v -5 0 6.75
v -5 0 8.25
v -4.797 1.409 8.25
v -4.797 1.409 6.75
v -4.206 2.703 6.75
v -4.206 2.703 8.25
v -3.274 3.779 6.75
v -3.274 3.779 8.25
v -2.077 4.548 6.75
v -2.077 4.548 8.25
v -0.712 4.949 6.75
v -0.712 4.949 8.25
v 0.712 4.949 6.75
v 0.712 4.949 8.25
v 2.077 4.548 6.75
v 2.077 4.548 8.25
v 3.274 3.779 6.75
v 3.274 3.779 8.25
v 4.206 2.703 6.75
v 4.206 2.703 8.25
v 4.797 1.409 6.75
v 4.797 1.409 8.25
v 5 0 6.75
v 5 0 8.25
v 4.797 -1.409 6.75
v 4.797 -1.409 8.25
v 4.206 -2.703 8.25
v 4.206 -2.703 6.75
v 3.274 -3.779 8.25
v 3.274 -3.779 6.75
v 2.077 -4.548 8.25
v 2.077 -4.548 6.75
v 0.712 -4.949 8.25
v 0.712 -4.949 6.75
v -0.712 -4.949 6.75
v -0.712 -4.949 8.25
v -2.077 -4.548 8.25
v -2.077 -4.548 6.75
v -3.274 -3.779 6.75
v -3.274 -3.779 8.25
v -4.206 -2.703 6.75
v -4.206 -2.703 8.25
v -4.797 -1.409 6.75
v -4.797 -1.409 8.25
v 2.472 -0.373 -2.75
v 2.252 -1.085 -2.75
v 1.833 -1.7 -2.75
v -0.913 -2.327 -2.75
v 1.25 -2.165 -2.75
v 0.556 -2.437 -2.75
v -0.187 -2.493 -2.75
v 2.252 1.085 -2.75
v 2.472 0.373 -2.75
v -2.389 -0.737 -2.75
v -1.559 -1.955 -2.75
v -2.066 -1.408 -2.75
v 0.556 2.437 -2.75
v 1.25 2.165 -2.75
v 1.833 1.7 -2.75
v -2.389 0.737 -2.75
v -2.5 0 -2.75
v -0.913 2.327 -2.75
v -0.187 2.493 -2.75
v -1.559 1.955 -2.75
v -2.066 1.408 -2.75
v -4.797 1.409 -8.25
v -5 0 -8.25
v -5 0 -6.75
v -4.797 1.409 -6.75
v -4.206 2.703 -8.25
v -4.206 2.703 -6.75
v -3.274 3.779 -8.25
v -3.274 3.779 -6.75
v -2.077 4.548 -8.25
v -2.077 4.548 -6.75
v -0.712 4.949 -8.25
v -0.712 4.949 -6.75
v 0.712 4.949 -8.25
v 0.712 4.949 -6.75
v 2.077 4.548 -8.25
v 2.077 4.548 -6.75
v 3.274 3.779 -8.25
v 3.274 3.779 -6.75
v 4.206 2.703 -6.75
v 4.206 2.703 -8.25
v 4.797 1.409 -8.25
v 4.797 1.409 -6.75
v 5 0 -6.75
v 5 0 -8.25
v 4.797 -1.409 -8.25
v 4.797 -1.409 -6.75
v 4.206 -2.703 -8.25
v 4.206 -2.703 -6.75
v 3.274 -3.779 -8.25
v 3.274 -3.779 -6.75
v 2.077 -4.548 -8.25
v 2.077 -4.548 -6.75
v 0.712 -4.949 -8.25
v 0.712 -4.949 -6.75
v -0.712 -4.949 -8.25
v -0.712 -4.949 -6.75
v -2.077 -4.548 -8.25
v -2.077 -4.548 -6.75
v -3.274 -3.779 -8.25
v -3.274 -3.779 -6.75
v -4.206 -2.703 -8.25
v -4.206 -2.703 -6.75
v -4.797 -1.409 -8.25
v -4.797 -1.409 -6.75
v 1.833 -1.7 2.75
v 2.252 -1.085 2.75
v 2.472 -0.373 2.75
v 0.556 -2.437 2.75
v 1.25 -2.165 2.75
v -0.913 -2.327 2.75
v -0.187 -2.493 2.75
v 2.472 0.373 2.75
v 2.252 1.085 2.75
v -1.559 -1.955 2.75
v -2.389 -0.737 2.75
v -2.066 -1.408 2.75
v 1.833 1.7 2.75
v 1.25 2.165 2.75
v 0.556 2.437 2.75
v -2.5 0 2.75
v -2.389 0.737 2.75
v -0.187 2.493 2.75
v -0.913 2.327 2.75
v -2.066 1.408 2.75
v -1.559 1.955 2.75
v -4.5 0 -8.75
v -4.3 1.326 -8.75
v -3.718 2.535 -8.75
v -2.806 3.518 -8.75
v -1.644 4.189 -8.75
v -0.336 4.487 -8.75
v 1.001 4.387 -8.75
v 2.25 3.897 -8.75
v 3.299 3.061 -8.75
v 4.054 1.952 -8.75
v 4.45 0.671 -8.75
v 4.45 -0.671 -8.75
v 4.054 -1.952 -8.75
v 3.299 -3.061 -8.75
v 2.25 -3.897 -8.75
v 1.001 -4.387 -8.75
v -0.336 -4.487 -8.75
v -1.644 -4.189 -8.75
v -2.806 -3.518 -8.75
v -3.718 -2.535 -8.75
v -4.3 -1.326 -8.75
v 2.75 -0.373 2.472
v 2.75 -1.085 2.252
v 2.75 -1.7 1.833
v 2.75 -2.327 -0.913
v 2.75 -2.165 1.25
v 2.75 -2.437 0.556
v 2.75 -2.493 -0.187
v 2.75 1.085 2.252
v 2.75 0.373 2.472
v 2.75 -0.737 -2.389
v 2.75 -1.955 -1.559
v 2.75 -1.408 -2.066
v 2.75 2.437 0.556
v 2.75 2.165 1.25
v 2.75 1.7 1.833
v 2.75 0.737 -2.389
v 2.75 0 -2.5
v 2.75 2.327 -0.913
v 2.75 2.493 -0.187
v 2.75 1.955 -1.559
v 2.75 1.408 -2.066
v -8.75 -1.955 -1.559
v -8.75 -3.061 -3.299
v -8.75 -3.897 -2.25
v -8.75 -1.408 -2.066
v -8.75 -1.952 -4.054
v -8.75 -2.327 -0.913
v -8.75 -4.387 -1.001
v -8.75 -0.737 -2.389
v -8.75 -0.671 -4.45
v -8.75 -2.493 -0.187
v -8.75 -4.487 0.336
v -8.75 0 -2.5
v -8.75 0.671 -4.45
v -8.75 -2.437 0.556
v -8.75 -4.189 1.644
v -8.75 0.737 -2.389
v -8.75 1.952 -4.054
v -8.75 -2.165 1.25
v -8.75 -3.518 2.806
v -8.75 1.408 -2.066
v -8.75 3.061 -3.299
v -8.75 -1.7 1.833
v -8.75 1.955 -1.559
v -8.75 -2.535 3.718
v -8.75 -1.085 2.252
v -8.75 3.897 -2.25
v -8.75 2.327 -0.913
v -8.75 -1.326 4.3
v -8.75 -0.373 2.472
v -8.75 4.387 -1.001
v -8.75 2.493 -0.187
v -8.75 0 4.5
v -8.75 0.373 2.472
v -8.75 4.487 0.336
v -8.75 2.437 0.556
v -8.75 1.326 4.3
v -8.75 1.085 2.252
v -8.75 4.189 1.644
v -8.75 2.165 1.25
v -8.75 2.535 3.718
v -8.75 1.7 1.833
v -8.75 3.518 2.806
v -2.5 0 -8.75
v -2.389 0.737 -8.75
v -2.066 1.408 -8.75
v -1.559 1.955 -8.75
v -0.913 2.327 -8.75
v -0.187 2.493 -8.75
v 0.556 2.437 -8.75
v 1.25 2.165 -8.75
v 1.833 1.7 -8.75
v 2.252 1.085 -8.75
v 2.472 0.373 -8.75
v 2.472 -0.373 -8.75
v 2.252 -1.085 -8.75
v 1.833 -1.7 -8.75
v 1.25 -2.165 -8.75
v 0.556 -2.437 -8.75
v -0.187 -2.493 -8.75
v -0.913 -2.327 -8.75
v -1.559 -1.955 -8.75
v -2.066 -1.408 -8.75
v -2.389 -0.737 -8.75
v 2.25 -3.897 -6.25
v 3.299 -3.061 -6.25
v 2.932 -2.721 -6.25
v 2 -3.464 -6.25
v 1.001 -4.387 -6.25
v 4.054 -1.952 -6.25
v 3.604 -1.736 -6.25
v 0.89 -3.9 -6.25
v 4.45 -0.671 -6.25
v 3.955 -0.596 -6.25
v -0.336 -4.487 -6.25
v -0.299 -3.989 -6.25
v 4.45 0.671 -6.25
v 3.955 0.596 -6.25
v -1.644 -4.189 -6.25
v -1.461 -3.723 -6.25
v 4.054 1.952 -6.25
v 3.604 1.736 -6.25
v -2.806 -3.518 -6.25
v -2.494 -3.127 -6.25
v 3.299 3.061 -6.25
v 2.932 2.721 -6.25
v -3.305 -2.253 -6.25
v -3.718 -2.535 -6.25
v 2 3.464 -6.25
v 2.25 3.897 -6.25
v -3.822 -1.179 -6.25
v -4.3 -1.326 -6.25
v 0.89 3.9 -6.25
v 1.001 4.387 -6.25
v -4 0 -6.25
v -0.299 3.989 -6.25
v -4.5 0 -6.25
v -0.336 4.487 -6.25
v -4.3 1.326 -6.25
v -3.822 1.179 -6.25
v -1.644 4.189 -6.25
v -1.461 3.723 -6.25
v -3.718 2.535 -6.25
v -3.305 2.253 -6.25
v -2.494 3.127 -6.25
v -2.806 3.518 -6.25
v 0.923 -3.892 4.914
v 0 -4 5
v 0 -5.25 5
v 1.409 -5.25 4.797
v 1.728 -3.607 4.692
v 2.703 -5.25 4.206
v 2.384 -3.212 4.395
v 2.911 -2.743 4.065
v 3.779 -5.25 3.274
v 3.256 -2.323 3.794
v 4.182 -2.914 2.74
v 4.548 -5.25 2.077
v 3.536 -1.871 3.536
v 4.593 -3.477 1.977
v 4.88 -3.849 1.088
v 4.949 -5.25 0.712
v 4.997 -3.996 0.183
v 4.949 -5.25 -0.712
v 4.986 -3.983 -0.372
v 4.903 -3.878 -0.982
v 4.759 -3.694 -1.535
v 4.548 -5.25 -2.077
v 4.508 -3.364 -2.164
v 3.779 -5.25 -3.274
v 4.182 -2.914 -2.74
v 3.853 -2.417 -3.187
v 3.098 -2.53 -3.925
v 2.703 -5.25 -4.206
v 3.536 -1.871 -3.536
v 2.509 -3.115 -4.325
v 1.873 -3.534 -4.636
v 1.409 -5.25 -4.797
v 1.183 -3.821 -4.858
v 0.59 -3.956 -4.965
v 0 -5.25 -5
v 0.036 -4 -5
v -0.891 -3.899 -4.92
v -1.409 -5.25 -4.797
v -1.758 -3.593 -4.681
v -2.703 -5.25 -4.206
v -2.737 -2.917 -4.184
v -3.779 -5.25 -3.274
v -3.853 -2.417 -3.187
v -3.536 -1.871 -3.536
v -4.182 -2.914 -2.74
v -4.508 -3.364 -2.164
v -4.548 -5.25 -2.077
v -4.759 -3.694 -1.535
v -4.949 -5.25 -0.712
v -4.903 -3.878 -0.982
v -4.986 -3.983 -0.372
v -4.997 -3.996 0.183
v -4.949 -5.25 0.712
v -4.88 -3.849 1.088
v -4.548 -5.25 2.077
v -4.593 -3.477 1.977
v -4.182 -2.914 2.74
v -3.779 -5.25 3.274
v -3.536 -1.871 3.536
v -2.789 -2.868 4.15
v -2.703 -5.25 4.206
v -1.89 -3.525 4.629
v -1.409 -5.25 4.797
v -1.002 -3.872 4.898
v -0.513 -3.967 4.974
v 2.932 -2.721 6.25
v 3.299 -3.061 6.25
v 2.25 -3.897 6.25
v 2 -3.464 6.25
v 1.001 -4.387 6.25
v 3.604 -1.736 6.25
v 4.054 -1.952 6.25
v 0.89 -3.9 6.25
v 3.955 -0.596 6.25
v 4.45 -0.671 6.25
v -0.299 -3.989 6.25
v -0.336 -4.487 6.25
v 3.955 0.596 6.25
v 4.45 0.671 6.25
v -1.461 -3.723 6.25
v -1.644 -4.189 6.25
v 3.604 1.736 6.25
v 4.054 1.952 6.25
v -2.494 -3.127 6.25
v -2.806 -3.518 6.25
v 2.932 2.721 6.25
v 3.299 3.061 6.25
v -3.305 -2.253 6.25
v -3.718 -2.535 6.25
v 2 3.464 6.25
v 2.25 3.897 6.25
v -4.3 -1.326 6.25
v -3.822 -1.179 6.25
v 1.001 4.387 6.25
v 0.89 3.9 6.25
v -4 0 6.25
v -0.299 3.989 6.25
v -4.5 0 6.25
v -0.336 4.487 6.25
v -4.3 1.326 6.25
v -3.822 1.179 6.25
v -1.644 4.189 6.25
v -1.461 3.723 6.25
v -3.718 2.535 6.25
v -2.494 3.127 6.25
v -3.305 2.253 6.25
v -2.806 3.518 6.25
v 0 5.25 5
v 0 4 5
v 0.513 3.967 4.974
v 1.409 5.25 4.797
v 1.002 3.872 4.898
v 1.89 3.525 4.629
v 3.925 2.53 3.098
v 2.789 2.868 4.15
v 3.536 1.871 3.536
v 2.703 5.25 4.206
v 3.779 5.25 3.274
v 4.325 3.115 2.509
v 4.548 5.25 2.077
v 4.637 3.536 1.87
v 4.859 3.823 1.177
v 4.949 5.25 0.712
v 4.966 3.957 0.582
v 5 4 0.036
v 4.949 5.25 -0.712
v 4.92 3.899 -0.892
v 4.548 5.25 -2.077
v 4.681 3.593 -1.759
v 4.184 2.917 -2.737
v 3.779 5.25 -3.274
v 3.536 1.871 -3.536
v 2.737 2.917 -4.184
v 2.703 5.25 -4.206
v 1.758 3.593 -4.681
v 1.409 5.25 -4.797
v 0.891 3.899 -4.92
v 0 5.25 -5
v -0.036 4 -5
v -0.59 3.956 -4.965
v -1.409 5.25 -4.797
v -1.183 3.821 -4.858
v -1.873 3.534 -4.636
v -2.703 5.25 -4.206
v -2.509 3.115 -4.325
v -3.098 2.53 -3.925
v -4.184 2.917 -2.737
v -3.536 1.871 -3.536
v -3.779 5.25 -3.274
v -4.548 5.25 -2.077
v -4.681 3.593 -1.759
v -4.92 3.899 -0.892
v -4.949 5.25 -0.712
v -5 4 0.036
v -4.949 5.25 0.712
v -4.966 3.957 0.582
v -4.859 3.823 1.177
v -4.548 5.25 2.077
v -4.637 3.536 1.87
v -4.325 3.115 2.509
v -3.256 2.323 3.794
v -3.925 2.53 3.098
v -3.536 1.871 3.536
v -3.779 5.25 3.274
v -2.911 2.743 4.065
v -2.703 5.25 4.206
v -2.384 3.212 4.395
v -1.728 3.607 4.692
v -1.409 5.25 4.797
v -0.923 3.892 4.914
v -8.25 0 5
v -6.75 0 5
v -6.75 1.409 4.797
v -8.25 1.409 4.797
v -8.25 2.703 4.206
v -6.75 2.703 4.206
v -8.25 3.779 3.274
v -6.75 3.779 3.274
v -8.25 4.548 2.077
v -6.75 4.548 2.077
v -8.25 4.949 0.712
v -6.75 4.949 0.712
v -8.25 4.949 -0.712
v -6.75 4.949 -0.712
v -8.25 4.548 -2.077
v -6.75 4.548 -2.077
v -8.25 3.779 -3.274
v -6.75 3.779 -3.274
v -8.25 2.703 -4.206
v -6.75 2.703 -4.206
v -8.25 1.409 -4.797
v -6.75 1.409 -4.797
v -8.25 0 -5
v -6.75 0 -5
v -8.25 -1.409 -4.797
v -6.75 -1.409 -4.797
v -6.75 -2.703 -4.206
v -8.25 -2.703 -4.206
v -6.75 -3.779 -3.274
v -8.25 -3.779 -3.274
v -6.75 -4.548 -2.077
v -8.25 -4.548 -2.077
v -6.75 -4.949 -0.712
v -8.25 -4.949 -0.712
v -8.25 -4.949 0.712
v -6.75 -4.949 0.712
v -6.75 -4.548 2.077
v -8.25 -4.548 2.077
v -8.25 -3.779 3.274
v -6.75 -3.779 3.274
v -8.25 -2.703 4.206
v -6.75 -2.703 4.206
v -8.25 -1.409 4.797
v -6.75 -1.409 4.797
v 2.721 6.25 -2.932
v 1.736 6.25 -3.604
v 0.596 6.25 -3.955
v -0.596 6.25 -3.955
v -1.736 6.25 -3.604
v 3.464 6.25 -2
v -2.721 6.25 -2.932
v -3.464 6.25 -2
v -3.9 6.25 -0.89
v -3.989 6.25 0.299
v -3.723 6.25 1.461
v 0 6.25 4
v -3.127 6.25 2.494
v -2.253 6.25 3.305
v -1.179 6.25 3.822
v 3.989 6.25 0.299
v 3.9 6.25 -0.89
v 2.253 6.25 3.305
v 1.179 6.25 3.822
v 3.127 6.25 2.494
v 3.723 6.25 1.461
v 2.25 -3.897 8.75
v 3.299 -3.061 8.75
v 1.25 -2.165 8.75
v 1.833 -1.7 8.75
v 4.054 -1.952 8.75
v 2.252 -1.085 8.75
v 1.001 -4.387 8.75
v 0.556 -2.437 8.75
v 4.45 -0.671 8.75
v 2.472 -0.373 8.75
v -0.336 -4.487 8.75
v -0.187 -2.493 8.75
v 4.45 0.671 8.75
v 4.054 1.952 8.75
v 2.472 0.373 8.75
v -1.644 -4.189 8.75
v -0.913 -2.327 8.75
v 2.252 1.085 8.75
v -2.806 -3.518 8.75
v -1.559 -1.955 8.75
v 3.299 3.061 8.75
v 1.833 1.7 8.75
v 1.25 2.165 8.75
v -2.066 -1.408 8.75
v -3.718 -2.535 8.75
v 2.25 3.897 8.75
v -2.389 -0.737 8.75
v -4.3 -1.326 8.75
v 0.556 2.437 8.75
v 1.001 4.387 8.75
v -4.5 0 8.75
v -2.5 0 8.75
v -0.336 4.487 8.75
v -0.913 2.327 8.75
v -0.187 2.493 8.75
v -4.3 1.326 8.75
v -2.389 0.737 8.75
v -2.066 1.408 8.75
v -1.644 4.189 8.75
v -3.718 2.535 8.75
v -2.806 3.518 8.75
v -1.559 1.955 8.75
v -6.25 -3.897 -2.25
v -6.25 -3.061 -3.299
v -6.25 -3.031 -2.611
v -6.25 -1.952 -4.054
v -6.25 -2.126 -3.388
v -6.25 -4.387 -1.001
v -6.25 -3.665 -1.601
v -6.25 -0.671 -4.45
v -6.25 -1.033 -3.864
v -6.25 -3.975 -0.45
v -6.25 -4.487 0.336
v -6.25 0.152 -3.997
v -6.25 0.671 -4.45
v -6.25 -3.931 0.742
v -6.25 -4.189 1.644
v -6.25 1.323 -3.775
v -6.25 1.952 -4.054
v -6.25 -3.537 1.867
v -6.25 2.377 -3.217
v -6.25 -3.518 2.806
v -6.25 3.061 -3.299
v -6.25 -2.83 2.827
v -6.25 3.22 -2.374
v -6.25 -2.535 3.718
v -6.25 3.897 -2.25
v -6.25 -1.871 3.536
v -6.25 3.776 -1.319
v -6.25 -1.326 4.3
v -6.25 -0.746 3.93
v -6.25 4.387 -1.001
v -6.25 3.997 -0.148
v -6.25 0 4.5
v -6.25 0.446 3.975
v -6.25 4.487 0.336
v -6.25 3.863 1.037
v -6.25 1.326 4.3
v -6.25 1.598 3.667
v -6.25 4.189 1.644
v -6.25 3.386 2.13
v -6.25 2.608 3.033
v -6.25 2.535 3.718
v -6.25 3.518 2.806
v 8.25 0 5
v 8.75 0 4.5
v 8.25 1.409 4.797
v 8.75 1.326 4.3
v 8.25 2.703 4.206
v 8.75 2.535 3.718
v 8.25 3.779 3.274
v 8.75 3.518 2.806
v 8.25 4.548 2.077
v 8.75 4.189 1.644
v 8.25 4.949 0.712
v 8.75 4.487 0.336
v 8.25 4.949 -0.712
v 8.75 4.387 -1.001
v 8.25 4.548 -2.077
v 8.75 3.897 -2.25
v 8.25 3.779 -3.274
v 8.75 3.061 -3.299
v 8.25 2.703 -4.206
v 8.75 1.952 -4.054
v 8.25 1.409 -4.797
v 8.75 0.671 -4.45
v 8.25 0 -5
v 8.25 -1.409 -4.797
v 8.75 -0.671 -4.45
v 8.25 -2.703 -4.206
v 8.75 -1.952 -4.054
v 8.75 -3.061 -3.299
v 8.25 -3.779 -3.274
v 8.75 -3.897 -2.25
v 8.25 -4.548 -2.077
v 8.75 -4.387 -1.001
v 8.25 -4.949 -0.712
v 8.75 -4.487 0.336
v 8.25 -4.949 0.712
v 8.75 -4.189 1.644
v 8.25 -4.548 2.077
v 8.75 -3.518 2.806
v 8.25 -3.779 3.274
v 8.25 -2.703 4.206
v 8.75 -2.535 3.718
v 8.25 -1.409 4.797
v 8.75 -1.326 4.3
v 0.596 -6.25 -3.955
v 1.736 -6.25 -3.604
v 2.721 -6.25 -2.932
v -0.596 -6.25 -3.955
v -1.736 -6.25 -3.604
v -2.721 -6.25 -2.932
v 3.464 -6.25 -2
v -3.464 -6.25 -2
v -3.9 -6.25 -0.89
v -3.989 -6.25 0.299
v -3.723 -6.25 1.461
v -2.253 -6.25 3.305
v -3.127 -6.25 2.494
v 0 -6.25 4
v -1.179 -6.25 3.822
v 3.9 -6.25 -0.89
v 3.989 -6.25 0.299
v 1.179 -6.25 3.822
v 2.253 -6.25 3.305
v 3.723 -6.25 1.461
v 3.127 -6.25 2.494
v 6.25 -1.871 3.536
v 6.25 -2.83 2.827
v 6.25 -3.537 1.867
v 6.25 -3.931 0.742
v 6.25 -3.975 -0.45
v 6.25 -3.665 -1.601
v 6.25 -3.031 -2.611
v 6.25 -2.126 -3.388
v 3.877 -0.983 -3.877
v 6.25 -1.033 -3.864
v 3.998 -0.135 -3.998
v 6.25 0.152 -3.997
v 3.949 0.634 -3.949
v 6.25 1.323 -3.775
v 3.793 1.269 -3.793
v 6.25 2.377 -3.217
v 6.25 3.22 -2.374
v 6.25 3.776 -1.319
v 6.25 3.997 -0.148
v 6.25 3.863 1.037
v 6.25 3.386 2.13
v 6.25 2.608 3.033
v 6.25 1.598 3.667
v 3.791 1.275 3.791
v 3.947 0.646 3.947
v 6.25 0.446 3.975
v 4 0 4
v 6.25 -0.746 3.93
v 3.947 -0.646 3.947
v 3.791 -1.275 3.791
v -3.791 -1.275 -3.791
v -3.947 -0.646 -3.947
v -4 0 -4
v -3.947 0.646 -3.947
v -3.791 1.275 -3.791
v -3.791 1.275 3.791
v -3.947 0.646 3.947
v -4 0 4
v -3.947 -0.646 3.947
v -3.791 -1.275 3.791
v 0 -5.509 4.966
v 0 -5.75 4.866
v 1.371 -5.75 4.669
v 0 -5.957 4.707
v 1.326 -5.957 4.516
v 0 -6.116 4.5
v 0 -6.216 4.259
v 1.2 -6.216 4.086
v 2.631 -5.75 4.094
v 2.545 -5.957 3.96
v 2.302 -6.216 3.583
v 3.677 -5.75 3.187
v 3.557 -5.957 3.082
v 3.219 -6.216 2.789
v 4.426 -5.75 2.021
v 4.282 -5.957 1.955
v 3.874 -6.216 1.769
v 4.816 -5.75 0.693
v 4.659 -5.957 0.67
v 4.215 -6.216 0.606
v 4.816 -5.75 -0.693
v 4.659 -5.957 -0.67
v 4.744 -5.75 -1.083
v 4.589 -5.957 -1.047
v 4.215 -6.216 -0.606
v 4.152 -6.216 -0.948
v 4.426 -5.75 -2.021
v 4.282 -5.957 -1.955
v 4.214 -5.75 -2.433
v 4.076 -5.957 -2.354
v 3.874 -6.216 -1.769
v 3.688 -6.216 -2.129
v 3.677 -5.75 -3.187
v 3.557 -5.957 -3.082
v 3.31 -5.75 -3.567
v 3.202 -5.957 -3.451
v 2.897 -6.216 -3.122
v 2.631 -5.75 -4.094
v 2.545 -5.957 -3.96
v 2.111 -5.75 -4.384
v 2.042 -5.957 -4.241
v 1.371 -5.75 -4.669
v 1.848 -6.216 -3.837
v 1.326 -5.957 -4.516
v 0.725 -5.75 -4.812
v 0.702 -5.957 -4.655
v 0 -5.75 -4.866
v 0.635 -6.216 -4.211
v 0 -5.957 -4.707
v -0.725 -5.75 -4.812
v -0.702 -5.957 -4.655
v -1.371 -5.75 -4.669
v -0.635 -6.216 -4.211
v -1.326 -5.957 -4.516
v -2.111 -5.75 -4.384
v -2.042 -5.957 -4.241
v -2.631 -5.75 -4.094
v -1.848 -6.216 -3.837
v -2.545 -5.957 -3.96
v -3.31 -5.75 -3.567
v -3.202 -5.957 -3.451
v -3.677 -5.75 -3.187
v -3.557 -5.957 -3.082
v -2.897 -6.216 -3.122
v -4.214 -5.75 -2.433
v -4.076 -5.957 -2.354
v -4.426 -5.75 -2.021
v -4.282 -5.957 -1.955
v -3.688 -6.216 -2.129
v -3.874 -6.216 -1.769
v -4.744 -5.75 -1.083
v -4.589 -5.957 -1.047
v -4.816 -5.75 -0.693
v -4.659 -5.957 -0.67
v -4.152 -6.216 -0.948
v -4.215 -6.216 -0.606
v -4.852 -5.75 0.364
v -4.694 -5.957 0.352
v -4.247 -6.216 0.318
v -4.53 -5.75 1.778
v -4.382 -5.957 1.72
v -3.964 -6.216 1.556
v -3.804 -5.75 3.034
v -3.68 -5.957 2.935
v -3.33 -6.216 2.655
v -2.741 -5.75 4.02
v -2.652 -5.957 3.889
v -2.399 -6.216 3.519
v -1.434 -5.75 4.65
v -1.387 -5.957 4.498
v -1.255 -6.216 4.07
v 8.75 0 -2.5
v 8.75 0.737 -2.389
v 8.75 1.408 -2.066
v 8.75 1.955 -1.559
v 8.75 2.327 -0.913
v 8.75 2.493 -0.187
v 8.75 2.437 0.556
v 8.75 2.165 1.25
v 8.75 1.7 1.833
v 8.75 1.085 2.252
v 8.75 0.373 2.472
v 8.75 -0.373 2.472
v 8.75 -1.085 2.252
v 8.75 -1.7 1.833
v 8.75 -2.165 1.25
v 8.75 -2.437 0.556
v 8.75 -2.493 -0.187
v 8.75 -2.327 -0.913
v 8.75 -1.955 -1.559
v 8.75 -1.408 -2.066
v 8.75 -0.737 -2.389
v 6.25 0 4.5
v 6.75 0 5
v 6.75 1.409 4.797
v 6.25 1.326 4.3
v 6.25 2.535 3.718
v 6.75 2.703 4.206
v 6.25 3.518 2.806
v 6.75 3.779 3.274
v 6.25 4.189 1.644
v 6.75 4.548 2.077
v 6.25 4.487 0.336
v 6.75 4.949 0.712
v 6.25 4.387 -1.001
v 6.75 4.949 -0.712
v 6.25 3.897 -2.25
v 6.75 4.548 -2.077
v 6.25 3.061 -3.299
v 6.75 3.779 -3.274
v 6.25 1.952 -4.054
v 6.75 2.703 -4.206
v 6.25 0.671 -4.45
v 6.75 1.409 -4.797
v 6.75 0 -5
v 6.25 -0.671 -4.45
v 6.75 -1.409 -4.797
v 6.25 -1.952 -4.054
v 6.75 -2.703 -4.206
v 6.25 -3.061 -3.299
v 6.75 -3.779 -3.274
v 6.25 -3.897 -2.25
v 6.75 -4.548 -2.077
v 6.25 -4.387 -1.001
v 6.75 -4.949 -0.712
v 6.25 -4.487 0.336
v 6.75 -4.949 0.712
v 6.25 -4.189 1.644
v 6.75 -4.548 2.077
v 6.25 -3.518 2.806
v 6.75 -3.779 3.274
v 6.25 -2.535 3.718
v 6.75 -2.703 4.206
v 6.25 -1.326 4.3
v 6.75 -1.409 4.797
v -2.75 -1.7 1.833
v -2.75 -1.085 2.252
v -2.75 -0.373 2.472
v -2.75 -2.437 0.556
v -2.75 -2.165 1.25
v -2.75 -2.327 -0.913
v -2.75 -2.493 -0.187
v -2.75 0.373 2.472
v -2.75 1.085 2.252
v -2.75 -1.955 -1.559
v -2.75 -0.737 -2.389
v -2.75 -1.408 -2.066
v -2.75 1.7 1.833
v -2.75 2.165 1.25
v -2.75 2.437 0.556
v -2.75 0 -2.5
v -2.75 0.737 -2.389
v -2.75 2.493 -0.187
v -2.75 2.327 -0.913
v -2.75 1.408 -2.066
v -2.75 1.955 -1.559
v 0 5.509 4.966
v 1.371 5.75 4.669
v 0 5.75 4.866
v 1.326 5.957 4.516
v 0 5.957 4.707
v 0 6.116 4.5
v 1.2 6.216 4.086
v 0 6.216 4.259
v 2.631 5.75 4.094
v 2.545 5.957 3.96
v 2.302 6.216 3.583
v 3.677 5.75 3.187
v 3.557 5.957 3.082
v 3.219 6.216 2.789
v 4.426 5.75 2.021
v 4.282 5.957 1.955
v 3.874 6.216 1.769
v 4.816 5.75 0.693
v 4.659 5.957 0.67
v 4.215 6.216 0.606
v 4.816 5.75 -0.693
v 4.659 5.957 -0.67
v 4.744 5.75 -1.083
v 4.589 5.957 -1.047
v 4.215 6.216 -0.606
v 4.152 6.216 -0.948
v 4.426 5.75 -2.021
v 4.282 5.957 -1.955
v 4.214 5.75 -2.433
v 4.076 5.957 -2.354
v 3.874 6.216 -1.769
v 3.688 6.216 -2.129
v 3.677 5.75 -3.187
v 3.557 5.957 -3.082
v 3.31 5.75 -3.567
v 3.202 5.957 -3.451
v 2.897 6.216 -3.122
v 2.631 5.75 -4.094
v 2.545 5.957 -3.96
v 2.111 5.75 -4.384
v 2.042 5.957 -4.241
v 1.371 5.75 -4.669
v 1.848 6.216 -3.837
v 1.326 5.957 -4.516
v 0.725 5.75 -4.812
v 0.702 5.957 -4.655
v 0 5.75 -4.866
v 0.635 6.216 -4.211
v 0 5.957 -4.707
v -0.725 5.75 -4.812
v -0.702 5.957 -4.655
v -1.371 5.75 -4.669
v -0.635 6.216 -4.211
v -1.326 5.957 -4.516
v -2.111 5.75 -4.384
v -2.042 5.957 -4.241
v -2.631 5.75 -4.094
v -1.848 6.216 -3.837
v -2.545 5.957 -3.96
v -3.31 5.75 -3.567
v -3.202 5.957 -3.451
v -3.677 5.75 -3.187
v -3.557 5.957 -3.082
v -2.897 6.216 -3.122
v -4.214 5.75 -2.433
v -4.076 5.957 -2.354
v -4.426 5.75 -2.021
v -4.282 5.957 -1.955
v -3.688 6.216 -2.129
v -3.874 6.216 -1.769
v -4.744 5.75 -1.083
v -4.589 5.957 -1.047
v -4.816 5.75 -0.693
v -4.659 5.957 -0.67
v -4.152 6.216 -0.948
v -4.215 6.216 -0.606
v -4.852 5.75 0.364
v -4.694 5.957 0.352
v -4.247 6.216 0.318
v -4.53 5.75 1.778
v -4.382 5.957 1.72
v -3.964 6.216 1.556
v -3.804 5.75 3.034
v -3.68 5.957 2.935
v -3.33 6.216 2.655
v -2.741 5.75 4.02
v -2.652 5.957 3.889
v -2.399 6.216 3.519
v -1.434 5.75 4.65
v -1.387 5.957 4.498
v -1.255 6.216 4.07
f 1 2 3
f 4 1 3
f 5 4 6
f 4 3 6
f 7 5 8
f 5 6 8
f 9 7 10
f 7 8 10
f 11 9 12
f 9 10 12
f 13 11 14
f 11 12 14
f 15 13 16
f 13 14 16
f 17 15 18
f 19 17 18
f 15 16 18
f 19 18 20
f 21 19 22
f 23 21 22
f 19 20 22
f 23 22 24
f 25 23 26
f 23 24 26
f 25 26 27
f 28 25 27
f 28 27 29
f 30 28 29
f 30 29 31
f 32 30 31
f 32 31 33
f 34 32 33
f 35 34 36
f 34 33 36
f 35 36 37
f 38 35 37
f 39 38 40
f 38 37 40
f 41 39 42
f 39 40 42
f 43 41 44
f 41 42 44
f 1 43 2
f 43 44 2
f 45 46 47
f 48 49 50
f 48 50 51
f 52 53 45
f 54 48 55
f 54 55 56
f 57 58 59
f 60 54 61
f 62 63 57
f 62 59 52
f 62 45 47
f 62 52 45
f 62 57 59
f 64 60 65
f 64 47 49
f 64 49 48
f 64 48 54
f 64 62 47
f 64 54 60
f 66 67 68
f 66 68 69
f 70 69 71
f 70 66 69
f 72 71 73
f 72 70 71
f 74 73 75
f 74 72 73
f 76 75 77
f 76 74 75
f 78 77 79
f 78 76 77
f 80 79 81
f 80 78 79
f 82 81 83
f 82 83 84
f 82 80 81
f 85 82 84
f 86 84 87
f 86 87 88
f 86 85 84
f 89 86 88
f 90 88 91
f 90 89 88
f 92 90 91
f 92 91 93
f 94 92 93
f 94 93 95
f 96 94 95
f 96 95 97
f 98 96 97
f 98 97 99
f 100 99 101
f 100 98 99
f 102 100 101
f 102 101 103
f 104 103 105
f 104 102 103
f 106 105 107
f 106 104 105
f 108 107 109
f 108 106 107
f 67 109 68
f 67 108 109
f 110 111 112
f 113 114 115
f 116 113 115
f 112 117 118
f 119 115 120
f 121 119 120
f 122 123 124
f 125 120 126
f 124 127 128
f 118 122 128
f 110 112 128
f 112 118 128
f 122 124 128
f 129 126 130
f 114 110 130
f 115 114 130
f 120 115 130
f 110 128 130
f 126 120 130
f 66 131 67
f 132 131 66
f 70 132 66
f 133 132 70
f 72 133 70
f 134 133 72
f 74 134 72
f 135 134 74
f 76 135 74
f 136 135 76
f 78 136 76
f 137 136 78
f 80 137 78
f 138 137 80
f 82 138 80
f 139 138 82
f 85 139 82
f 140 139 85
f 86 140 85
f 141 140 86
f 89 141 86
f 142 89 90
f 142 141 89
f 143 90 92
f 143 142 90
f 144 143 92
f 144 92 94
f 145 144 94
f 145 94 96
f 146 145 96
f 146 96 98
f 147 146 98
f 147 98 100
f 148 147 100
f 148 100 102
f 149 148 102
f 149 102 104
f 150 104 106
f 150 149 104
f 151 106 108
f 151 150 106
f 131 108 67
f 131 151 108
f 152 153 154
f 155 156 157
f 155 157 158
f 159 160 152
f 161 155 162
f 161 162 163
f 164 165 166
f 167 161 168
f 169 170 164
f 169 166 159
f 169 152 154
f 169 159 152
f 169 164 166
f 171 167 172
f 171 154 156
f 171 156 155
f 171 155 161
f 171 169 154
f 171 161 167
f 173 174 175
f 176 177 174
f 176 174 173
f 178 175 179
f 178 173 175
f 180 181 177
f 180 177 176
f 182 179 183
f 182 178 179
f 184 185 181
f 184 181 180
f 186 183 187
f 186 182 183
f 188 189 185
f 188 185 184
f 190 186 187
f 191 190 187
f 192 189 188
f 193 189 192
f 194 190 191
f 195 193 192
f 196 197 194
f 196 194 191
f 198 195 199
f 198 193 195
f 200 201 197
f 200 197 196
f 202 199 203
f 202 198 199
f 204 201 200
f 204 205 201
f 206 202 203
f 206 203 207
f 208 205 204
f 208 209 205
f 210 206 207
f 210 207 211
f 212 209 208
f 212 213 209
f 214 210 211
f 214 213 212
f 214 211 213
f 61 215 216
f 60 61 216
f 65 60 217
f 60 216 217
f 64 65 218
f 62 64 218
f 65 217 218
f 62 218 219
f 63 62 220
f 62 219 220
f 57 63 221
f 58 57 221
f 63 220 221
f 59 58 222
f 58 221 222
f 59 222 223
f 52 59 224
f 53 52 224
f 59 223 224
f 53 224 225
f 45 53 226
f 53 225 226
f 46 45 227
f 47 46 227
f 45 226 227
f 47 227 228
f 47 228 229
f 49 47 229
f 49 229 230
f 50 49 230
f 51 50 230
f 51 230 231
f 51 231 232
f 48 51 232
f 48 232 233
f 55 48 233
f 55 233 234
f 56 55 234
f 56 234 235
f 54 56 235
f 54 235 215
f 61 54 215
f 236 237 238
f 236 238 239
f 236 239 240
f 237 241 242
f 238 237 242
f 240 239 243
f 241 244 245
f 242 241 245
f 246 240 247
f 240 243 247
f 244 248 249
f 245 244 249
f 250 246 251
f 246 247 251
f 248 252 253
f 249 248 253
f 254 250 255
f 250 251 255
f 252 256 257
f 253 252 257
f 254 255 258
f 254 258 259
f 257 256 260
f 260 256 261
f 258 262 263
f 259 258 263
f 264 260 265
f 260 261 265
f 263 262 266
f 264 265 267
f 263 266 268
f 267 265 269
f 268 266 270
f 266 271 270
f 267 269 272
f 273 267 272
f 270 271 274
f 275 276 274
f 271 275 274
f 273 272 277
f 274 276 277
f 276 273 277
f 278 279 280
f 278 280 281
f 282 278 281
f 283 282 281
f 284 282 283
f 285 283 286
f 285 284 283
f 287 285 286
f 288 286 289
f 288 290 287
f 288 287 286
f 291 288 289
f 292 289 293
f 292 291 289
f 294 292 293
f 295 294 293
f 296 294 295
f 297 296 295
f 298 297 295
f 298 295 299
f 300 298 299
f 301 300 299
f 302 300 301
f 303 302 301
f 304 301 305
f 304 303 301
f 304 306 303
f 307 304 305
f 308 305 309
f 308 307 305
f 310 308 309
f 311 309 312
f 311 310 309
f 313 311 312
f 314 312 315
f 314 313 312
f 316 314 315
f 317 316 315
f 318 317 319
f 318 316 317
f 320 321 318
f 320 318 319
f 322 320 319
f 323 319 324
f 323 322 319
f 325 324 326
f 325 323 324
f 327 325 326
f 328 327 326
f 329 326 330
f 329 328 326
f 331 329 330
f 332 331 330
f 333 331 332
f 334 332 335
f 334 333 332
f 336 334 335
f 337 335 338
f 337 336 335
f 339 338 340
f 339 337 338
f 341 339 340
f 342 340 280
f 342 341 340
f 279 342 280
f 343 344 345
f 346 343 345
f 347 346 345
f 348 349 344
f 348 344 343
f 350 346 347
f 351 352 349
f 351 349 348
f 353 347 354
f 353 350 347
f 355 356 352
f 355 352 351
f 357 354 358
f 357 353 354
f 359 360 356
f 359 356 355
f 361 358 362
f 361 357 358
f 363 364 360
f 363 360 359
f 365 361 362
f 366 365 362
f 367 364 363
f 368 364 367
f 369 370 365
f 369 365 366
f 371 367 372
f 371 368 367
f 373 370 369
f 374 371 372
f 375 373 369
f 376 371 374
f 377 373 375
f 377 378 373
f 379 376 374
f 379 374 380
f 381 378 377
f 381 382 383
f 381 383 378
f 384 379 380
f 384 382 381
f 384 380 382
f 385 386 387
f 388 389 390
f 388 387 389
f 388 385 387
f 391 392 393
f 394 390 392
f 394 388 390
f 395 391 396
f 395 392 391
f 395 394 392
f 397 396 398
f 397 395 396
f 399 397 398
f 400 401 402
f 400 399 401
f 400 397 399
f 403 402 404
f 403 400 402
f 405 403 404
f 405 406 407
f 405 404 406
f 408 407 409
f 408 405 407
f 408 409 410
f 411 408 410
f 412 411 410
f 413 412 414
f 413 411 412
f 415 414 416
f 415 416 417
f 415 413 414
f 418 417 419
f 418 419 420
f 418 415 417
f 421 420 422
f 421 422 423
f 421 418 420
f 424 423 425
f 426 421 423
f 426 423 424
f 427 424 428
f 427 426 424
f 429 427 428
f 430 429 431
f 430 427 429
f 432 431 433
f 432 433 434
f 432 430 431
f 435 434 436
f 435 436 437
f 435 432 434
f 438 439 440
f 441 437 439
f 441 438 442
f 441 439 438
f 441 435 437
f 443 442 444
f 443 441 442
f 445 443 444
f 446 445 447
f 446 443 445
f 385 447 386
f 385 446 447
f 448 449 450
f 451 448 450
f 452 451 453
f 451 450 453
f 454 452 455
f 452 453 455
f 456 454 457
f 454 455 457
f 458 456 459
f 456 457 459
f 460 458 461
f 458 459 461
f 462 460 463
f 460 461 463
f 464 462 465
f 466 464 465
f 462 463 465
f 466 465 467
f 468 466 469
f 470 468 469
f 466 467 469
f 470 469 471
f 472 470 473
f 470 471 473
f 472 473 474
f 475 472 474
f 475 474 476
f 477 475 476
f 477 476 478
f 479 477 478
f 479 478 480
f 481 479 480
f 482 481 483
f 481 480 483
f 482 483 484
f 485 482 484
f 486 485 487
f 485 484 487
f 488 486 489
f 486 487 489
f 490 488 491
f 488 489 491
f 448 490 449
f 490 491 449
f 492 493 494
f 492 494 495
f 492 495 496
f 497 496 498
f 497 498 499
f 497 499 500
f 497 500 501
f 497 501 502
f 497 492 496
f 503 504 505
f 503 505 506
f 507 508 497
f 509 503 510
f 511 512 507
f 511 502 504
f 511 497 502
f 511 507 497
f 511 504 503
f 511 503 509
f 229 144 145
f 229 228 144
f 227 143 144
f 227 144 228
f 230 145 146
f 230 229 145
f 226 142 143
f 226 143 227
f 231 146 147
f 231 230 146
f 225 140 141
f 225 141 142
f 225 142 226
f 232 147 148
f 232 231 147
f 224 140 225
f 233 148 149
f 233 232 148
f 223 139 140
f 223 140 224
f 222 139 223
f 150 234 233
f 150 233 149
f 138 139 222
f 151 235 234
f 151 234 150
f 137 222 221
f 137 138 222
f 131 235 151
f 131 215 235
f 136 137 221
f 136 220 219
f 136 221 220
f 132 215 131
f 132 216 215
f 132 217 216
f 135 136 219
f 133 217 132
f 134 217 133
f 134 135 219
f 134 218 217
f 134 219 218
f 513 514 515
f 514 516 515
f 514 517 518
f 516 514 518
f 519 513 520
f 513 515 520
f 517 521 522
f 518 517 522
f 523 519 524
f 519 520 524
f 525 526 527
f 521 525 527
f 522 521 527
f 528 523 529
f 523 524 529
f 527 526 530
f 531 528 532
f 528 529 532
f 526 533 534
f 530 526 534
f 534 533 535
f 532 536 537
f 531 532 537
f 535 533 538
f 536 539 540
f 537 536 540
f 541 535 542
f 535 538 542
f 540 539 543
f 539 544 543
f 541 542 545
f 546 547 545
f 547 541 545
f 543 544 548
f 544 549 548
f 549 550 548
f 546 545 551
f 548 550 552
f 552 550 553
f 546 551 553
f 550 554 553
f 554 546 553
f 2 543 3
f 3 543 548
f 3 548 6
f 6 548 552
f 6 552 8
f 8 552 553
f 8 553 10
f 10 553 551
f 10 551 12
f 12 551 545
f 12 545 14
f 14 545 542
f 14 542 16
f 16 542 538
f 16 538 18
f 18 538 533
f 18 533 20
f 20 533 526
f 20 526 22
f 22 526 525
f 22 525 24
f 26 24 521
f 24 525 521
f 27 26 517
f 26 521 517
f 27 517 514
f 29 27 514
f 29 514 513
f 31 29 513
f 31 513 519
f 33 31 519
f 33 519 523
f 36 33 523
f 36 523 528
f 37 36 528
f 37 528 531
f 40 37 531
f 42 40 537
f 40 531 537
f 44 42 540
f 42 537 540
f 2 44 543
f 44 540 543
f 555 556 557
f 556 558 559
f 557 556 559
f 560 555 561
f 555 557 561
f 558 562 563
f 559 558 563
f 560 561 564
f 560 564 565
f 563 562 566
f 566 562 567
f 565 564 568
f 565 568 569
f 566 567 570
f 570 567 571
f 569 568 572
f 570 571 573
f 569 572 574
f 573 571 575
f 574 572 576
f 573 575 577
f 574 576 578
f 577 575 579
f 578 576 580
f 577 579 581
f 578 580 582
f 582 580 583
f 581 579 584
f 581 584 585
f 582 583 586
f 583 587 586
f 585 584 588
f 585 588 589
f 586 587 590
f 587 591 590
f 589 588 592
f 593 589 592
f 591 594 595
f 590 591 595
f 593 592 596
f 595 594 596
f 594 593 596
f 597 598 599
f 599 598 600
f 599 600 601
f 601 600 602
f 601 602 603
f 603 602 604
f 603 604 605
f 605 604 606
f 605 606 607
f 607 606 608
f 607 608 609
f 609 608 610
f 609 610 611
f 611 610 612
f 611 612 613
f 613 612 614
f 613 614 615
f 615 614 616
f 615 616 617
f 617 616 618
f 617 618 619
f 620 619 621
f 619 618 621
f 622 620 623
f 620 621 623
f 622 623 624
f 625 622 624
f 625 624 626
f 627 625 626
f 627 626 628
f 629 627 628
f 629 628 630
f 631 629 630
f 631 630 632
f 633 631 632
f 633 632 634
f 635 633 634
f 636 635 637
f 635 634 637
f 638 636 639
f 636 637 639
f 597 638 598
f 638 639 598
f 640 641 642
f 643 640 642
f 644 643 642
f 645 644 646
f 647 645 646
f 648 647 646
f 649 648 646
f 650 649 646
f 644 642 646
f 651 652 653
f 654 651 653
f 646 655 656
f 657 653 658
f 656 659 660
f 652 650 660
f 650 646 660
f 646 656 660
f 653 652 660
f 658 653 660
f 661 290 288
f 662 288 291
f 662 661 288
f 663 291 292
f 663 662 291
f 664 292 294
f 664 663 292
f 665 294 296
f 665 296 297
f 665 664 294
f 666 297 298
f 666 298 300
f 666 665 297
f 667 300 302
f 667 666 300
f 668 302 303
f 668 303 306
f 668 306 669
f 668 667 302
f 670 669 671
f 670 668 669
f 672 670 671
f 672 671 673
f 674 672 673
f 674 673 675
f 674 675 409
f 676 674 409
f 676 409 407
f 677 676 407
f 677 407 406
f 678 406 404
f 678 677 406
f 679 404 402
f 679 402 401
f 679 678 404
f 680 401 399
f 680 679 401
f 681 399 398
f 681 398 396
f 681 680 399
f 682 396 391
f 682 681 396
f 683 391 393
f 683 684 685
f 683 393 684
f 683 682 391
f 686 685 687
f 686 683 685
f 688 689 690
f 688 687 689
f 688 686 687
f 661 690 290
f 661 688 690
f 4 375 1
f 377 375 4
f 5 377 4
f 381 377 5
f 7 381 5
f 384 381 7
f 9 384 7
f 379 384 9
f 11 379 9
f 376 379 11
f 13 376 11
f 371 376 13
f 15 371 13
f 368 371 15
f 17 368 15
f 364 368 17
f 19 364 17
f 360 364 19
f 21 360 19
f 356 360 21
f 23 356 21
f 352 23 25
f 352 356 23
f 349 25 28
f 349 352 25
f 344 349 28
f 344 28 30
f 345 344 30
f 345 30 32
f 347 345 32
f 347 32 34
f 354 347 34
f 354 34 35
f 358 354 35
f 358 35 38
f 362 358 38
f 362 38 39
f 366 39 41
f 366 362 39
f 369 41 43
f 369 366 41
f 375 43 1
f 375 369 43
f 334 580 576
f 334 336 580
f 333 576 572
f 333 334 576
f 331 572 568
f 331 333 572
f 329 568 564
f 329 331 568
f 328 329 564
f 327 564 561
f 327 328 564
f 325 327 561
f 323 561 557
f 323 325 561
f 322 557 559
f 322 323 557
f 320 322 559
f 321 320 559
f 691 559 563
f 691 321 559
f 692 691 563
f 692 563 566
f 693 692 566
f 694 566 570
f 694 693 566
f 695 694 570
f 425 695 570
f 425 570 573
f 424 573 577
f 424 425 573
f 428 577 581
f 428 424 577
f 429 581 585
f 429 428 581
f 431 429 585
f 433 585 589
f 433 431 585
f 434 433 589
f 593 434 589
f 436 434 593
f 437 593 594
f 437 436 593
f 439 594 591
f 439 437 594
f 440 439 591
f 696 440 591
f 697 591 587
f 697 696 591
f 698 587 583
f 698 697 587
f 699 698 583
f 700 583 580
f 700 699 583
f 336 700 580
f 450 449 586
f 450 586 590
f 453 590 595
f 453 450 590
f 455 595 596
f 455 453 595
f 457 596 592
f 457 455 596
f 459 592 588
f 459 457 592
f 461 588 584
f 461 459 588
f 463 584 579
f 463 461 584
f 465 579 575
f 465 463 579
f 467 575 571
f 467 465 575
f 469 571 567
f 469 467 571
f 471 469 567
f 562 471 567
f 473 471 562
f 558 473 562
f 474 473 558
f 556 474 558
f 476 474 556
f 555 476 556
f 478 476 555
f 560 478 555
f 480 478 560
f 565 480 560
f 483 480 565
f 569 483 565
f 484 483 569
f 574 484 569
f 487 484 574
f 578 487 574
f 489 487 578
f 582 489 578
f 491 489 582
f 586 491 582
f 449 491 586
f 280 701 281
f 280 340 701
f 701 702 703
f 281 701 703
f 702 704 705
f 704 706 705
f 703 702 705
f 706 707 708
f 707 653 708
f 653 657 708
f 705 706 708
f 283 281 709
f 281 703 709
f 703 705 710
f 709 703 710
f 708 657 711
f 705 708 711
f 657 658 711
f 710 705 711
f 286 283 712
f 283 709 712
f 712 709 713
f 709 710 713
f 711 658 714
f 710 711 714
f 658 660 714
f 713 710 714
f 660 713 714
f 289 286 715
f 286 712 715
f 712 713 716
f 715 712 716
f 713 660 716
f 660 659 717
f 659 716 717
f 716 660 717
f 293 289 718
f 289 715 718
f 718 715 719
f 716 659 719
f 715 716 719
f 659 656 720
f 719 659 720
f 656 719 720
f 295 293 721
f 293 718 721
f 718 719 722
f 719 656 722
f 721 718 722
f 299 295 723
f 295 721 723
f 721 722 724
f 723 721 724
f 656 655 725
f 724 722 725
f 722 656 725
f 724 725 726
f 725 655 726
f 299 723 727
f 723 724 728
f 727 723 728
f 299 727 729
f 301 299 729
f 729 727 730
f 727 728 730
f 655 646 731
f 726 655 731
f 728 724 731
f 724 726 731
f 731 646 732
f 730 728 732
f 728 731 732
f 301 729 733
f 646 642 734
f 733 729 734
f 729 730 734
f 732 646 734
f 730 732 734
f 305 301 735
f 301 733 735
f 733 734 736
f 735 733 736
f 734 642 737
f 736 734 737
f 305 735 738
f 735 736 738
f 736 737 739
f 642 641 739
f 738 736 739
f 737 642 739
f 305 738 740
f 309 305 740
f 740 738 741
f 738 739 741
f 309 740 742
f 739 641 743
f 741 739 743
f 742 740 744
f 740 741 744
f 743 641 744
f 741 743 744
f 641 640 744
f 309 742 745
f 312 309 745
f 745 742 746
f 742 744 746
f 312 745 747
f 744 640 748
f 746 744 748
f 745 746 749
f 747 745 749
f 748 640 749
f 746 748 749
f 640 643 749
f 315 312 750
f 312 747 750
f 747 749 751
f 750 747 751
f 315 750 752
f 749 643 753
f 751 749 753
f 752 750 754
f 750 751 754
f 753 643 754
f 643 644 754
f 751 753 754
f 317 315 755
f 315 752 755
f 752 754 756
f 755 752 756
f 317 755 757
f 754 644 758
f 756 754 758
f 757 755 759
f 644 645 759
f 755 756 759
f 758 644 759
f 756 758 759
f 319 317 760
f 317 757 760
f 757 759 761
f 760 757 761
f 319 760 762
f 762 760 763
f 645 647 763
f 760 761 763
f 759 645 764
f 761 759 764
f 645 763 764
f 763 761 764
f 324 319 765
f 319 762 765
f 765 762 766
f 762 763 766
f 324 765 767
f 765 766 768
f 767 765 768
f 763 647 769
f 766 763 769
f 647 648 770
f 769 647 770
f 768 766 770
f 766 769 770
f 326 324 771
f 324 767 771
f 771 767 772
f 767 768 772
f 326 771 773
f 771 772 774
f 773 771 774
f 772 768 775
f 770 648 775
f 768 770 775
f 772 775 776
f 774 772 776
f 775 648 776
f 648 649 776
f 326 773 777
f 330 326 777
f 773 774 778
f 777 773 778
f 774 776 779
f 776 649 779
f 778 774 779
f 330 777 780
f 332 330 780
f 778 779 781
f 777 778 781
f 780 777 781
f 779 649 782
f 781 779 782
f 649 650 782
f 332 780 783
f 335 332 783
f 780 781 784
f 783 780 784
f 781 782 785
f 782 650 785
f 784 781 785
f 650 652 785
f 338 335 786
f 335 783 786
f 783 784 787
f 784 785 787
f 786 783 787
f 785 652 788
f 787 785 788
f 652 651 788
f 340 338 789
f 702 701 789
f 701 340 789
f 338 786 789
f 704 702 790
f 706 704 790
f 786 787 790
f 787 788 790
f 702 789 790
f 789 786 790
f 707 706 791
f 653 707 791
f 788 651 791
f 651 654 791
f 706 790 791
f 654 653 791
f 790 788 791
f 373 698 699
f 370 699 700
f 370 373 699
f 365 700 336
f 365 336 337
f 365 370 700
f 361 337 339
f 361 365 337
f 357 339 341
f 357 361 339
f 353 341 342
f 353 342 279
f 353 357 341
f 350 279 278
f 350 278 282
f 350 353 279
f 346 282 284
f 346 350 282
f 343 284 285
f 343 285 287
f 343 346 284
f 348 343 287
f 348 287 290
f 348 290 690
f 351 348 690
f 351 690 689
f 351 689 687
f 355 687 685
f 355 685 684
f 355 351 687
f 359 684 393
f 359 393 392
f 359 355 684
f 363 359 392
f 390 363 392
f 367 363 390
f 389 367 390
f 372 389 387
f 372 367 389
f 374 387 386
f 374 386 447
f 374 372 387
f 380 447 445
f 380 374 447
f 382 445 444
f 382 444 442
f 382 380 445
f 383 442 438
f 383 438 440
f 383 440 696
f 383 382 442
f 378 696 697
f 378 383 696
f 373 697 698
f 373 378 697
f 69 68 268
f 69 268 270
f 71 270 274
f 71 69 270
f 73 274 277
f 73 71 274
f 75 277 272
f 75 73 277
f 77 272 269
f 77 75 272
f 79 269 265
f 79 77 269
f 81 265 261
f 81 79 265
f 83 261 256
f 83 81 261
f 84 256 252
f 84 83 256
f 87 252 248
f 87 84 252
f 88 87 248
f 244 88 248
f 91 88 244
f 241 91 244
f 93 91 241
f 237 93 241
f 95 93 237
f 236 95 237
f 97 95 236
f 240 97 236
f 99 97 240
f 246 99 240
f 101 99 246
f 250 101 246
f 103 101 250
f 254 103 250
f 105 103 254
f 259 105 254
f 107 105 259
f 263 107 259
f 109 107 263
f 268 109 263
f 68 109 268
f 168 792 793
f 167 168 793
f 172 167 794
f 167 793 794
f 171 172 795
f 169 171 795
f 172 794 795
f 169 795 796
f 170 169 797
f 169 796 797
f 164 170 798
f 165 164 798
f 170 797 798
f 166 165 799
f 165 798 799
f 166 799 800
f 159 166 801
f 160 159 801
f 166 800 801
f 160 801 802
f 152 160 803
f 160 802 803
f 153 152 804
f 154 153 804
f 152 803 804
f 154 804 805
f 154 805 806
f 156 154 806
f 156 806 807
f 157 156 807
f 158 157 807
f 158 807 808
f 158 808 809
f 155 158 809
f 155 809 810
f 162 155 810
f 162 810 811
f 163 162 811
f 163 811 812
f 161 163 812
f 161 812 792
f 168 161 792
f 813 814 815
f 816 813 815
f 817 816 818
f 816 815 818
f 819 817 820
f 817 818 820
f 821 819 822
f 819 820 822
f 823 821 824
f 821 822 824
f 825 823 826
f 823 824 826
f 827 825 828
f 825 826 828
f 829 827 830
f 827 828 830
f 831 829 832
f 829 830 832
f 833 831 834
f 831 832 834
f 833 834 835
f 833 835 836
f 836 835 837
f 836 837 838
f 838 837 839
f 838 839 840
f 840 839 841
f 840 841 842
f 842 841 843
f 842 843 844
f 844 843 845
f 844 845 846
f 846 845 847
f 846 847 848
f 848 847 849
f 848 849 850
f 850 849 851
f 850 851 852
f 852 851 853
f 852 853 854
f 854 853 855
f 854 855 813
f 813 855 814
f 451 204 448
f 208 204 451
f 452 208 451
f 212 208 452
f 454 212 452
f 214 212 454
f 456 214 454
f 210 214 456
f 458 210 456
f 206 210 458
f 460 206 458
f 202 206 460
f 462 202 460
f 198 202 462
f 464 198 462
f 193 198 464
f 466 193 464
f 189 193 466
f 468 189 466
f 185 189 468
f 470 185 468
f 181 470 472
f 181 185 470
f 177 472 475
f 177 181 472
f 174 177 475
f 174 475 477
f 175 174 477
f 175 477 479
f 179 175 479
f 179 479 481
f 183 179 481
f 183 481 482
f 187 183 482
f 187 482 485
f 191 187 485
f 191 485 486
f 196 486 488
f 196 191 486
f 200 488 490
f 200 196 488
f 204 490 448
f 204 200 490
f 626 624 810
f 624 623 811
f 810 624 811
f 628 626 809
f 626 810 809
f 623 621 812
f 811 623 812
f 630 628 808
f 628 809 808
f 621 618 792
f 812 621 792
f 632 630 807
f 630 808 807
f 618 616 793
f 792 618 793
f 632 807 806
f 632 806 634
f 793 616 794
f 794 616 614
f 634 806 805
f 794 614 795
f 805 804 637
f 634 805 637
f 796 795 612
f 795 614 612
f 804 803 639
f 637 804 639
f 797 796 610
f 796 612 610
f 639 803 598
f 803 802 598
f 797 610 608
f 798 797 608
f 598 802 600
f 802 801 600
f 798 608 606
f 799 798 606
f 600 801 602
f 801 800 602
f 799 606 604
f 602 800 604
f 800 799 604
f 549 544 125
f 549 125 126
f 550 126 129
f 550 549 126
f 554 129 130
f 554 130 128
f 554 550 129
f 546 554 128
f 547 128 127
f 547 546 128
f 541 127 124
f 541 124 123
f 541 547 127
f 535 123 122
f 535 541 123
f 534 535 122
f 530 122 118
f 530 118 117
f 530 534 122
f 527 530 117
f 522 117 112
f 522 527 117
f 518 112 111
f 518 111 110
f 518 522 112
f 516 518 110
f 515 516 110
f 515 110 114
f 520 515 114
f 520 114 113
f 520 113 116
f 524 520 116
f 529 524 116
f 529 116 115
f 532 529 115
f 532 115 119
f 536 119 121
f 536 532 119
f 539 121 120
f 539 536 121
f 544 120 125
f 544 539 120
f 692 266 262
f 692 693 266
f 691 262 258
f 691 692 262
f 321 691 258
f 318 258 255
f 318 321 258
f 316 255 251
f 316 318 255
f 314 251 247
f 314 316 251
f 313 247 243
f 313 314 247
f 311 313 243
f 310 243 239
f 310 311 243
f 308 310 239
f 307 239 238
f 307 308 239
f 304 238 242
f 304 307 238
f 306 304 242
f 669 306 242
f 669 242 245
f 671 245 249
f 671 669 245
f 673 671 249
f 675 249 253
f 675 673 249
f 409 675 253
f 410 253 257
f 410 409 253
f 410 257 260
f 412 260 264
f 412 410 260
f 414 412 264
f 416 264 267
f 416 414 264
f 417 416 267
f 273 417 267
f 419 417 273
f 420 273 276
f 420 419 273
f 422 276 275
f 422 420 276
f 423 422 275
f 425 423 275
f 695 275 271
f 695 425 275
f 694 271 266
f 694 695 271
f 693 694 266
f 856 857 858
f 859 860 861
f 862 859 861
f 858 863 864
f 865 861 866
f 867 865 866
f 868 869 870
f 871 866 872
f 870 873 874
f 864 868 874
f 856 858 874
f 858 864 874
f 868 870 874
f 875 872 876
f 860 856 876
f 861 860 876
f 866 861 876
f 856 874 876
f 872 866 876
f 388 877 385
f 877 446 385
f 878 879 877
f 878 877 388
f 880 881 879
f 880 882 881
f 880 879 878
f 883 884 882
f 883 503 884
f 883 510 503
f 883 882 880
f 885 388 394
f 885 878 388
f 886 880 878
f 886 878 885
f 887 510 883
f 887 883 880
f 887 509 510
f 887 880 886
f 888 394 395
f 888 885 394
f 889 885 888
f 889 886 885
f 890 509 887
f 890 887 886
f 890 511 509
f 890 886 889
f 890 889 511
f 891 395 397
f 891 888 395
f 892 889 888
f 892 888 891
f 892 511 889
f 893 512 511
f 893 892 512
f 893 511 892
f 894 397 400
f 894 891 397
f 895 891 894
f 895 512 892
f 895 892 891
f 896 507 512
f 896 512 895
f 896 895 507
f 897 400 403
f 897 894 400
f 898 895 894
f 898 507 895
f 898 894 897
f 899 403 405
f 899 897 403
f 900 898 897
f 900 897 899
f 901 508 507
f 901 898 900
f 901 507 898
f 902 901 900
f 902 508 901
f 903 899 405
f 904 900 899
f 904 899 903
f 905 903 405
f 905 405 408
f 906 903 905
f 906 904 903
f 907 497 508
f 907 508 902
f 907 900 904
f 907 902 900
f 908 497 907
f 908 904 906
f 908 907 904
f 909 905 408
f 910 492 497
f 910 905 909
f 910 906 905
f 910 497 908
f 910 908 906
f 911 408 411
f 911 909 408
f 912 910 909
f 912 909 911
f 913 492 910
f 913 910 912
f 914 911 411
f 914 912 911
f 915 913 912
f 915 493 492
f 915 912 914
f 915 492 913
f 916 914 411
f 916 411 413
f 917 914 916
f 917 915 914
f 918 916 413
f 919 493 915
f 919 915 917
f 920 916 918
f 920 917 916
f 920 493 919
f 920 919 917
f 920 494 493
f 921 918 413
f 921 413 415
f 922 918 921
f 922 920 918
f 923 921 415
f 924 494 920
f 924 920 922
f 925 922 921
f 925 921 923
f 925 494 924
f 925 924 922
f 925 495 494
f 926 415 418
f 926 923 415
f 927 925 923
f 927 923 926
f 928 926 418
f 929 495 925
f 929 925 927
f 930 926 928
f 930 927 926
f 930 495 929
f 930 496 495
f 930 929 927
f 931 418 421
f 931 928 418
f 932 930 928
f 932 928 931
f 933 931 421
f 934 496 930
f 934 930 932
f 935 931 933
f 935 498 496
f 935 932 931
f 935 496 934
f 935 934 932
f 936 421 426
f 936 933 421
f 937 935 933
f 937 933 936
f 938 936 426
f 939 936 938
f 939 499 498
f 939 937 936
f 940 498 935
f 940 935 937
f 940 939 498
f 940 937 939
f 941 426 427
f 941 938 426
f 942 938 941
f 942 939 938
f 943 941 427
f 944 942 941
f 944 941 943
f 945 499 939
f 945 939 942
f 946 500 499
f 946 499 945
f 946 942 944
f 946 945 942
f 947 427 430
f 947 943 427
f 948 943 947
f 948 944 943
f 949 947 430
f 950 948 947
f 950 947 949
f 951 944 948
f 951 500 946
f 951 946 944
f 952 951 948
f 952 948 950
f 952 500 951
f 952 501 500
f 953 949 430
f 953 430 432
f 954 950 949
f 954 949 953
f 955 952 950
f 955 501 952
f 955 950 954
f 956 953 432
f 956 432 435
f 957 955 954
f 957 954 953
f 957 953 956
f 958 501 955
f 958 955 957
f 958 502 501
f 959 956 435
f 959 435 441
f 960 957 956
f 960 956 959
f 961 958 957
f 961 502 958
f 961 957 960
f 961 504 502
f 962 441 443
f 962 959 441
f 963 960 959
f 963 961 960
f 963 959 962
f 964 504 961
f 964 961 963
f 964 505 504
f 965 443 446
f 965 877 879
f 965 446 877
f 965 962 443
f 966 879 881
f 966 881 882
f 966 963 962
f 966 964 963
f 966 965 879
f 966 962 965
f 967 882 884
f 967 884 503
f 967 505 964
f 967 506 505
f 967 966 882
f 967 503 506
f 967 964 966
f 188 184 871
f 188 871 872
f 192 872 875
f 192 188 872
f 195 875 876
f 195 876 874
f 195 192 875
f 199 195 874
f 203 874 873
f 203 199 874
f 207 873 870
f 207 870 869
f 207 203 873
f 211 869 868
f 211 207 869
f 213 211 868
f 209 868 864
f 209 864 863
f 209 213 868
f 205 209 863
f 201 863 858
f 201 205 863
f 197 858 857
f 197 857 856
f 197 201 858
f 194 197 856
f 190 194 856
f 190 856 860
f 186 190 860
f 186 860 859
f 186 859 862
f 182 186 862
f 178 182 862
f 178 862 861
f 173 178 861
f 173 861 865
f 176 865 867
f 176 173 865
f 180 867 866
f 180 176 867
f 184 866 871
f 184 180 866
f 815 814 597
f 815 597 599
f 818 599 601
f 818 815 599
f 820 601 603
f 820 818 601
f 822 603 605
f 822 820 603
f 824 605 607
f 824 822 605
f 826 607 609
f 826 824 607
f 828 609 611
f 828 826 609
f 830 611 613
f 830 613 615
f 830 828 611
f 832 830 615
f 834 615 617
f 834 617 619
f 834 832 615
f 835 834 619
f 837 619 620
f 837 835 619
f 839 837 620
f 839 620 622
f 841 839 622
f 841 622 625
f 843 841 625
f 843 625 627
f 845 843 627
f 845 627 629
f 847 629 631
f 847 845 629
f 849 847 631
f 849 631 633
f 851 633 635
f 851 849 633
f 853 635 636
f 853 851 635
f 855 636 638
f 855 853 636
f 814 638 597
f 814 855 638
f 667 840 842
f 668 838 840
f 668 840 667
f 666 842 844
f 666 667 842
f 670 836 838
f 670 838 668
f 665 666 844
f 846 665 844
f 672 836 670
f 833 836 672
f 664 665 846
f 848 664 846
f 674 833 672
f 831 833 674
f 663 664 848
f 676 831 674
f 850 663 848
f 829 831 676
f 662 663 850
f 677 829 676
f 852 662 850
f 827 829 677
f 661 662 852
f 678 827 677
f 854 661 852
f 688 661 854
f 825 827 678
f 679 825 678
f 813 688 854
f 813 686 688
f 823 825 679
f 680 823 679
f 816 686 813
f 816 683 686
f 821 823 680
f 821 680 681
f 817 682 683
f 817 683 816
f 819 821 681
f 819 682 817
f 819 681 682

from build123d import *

# Parameters (mm, degrees)
SKETCH3_R           = 5
BOSS_EXTRUDE1_DEPTH = 6.25
FILLET1_R           = 1
SKETCH5_R           = 4
BOSS_EXTRUDE3_DEPTH = 8.75
SKETCH4_R           = 4
BOSS_EXTRUDE4_DEPTH = 8.75
SKETCH6_R           = 2.5
CUT_EXTRUDE3_DEPTH  = 6
SKETCH7_R           = 2.5
CUT_EXTRUDE4_DEPTH  = 6
BOSS_EXTRUDE5_START = -2.5
SKETCH8_R           = 5
SKETCH8_R_2         = 2.5
BOSS_EXTRUDE5_DEPTH = 2.5
SKETCH9_R           = 5
SKETCH9_R_2         = 2.5
BOSS_EXTRUDE6_DEPTH = 2.5
CHAMFER1_SIZE       = 0.5


with BuildPart() as part:
    # Sketch3 → Boss-Extrude1 (new, symmetric)
    with BuildSketch(Plane(origin=(0, 0, 0), x_dir=(1, 0, 0), z_dir=(0, 1, 0))):
        with Locations(Location((0, 0, 0), (0, 0, 270))):
            Circle(SKETCH3_R)
    extrude(amount=BOSS_EXTRUDE1_DEPTH, both=True)

    # Fillet1
    fillet1_edges = [part.edges().sort_by_distance(p)[0] for p in [
        (0, -6.25, -5),
        (0, 6.25, -5),
    ]]
    fillet(fillet1_edges, radius=FILLET1_R)

    # Sketch5 → Boss-Extrude3 (add, symmetric)
    with BuildSketch(Plane.XY):
        with Locations(Location((0, 0, 0), (0, 0, 180))):
            Circle(SKETCH5_R)
    extrude(amount=BOSS_EXTRUDE3_DEPTH, both=True)

    # Sketch4 → Boss-Extrude4 (add, symmetric)
    with BuildSketch(Plane(origin=(0, 0, 0), x_dir=(0, 0, -1), z_dir=(1, 0, 0))):
        with Locations(Location((0, 0, 0), (0, 0, 207.885566817))):
            Circle(SKETCH4_R)
    extrude(amount=BOSS_EXTRUDE4_DEPTH, both=True)

    # Sketch6 → Cut-Extrude3 (cut)
    with BuildSketch(Plane(origin=(8.75, 0, 0), x_dir=(0, 0, -1), z_dir=(1, 0, 0))):
        Circle(SKETCH6_R)
    cut_extrude3 = extrude(amount=-CUT_EXTRUDE3_DEPTH, mode=Mode.SUBTRACT)

    # Sketch7 → Cut-Extrude4 (cut)
    with BuildSketch(Plane(origin=(0, 0, -8.75), x_dir=(-1, 0, 0), z_dir=(0, 0, -1))):
        Circle(SKETCH7_R)
    cut_extrude4 = extrude(amount=-CUT_EXTRUDE4_DEPTH, mode=Mode.SUBTRACT)

    # Sketch8 → Boss-Extrude5 (add)
    with BuildSketch(Plane.ZY.offset(8.75).offset(BOSS_EXTRUDE5_START)):
        Circle(SKETCH8_R)
        with Locations(Location((0, 0, 0), (0, 0, 180))):
            Circle(SKETCH8_R_2, mode=Mode.SUBTRACT)
    boss_extrude5 = extrude(amount=BOSS_EXTRUDE5_DEPTH)

    # Mirror1: Boss-Extrude5 across plane
    add(boss_extrude5.mirror(Plane(origin=(0, 0, 0), x_dir=(0, 0, 1), z_dir=(1, 0, 0))))

    # Sketch9 → Boss-Extrude6 (add)
    with BuildSketch(Plane(origin=(0, 0, -8.75), x_dir=(-1, 0, 0), z_dir=(0, 0, -1))):
        Circle(SKETCH9_R)
        Circle(SKETCH9_R_2, mode=Mode.SUBTRACT)
    boss_extrude6 = extrude(amount=-BOSS_EXTRUDE6_DEPTH)

    # Mirror2: Boss-Extrude6 across plane
    add(boss_extrude6.mirror(Plane.XY))

    # Mirror3: Cut-Extrude3 across plane
    add(cut_extrude3.mirror(Plane(origin=(0, 0, 0), x_dir=(0, 0, 1), z_dir=(1, 0, 0))), mode=Mode.SUBTRACT)

    # Mirror4: Cut-Extrude4 across plane
    add(cut_extrude4.mirror(Plane.XY), mode=Mode.SUBTRACT)

    # Chamfer1
    chamfer1_edges = [part.edges().sort_by_distance(p)[0] for p in [
        (-6.25, 0, -5),
        (-8.75, 0, -5),
        (6.25, 0, -5),
        (8.75, 0, -5),
        (5, 0, -8.75),
        (5, 0, -6.25),
        (5, 0, 6.25),
        (5, 0, 8.75),
    ]]
    chamfer(chamfer1_edges, length=CHAMFER1_SIZE)


solid = part.part
